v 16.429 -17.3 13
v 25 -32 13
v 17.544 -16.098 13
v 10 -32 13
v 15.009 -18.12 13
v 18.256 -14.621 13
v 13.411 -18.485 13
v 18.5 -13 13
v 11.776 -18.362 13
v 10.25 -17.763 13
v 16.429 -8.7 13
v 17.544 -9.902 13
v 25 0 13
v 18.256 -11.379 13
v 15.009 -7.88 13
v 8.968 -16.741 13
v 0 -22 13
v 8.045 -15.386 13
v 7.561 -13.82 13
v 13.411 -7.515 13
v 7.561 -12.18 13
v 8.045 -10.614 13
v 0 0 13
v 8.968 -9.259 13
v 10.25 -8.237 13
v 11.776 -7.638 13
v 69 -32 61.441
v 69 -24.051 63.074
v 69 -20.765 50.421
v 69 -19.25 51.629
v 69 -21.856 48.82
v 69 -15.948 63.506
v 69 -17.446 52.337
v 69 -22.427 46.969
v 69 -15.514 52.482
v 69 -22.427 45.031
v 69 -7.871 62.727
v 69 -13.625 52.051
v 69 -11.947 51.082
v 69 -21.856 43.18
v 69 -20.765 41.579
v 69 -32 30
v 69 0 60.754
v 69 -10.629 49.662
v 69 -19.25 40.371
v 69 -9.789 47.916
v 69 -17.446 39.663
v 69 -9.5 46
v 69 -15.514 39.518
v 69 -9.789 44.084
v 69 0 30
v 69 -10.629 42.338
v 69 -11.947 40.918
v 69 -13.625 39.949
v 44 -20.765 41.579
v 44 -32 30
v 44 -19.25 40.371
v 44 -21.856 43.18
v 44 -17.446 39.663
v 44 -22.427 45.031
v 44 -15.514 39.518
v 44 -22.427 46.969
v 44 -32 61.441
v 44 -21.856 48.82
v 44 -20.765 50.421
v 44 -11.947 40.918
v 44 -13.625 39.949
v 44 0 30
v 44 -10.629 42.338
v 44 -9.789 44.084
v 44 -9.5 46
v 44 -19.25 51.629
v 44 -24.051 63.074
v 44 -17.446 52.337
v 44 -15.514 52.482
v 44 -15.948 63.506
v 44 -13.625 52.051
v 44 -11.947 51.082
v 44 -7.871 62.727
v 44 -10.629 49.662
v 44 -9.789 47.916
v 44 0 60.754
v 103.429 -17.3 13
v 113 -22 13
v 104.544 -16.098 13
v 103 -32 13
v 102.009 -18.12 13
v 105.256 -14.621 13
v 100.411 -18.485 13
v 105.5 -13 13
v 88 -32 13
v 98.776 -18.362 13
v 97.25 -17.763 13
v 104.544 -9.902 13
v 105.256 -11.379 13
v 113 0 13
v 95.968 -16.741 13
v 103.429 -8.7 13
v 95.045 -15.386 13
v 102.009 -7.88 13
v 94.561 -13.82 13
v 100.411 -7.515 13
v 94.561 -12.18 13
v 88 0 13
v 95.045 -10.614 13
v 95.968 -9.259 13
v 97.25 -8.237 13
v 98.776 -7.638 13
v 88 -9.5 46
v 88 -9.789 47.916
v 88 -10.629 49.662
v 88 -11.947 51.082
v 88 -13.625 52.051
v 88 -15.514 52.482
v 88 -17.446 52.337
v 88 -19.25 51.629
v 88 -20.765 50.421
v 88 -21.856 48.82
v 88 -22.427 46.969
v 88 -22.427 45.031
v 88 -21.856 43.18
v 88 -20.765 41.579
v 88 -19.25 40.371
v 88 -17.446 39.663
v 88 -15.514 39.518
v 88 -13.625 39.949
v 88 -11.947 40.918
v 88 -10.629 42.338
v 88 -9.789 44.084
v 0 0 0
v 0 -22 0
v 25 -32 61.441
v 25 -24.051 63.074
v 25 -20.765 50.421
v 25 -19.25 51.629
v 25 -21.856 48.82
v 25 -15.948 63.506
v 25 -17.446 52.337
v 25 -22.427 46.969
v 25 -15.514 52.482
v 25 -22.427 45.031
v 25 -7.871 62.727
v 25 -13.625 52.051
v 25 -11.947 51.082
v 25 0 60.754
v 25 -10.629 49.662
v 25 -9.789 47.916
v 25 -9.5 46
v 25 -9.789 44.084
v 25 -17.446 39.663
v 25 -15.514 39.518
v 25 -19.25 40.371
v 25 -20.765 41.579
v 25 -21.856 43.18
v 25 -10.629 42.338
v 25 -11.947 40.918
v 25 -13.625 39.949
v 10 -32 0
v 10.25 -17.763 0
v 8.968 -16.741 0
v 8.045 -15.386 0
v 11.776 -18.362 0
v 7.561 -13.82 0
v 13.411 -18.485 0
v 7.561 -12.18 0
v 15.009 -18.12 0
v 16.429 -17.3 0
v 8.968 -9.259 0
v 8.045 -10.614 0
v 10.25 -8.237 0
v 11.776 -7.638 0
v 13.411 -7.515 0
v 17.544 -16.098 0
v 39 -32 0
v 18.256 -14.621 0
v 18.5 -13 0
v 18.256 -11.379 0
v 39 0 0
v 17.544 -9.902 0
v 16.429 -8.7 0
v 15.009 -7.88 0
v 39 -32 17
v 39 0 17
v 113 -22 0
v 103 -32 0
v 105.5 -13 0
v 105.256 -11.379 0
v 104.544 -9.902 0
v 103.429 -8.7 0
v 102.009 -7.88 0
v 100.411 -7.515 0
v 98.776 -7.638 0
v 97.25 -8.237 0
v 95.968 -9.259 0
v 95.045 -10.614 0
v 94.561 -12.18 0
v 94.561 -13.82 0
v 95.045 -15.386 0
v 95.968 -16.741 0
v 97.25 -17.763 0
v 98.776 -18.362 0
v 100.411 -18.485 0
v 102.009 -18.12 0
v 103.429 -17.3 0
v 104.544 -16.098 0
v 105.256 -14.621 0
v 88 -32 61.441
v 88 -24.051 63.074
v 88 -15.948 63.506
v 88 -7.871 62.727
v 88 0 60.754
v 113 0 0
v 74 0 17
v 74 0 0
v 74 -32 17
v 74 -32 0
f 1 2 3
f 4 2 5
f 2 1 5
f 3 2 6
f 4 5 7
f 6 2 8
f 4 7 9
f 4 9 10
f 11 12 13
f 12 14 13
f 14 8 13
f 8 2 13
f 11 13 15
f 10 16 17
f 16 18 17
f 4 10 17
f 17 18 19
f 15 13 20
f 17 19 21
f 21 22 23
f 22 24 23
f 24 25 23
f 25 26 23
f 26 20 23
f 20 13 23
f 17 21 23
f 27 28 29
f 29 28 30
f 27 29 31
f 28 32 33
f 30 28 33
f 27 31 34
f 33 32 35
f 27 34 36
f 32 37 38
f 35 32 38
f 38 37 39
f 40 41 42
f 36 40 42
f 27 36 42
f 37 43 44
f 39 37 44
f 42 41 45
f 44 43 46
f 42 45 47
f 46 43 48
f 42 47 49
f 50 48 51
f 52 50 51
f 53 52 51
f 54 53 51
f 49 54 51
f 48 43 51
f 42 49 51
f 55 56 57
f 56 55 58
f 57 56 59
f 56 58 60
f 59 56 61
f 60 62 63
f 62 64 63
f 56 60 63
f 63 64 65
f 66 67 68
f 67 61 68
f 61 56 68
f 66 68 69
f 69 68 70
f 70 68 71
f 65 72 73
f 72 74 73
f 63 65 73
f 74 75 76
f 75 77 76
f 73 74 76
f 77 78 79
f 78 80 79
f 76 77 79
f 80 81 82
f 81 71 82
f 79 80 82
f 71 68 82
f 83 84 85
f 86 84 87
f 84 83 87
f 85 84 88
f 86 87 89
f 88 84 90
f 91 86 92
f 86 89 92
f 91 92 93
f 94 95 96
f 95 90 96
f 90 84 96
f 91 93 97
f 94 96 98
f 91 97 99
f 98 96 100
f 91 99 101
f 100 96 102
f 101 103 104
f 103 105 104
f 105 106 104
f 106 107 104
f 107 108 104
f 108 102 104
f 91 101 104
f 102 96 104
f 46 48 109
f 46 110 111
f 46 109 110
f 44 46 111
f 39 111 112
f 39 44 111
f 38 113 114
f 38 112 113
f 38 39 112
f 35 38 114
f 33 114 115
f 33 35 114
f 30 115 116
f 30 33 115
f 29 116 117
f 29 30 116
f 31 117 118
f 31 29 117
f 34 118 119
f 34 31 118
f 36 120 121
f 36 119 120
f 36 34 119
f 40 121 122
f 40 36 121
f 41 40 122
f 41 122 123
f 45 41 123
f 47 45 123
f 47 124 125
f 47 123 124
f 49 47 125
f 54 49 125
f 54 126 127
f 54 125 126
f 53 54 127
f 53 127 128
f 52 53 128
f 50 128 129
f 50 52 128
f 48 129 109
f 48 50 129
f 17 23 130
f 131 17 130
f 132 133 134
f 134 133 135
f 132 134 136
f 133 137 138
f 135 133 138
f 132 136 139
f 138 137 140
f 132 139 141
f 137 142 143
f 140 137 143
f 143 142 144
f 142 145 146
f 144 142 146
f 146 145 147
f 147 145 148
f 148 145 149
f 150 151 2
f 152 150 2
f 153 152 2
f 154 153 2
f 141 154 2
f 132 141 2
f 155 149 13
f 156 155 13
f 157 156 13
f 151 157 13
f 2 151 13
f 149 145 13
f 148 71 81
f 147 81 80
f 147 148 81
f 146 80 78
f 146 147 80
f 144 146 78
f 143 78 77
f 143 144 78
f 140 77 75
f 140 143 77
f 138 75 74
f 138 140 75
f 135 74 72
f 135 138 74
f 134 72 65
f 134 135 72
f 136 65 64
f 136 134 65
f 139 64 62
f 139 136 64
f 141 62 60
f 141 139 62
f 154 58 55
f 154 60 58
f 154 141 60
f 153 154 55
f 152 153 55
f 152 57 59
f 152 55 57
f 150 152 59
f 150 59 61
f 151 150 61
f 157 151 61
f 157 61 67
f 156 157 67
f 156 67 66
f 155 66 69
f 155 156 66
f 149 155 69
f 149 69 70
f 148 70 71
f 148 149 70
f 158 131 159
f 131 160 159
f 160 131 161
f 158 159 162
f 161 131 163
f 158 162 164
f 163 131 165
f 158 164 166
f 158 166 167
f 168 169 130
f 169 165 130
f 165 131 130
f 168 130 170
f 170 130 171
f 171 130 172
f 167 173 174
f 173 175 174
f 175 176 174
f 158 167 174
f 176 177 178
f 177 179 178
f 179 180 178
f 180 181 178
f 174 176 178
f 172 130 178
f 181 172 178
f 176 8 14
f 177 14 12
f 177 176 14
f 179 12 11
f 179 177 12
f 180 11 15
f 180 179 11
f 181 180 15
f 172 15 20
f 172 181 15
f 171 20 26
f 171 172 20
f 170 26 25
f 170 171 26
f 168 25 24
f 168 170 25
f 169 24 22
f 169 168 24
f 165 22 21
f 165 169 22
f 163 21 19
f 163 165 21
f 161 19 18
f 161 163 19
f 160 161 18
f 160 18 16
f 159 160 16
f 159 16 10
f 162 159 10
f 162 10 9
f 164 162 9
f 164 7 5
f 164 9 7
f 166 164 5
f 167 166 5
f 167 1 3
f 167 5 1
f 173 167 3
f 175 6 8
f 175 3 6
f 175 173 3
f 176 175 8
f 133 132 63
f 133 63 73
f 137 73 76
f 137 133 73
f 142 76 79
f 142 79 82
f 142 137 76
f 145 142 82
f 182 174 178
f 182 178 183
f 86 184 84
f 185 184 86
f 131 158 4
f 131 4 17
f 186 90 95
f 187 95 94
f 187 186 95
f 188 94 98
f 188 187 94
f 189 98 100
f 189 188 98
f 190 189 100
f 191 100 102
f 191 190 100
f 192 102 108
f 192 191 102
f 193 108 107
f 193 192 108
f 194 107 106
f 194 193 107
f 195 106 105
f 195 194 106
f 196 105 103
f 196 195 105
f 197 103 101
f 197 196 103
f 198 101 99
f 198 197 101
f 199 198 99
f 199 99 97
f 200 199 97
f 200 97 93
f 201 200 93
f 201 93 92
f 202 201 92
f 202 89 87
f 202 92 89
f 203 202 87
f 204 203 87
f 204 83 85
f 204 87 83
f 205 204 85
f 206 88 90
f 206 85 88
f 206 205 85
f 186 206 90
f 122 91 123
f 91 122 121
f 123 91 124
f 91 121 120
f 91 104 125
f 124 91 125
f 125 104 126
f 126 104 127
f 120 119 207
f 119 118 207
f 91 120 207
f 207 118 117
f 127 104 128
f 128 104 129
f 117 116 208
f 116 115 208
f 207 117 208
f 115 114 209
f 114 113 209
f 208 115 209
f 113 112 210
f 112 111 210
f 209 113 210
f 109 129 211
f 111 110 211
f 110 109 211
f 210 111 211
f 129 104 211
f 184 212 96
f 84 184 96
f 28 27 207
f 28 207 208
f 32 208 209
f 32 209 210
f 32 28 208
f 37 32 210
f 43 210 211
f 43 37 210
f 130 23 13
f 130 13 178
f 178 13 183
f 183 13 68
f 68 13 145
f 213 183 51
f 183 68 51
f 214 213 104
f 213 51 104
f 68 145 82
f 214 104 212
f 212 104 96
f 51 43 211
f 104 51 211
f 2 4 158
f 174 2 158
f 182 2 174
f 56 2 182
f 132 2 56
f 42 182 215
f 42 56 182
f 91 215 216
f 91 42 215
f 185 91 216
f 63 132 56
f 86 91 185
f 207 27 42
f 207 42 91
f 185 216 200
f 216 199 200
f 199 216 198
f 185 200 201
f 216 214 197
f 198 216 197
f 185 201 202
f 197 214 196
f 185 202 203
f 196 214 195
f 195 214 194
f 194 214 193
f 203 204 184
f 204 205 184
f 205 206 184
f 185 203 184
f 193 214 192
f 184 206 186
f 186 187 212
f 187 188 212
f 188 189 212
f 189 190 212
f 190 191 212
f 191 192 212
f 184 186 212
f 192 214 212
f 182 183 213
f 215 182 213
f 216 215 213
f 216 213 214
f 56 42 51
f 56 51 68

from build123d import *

# Parameters (mm, degrees)
F1_DEPTH = 32
F2_R     = 5.5
F3_DEPTH = 25
F4_R     = 6.5
F5_DEPTH = 132.41419


with BuildPart() as f1:
    # F0 (on Front) → F1 (new body)
    with BuildSketch(Plane.XZ):
        Polygon((0, 13), (0, 0), (39, 0), (39, 17), (74, 17), (74, 0), (113, 0), (113, 13), (88, 13), (88, 64), (69, 64), (69, 30), (44, 30), (44, 64), (25, 64), (25, 13), align=None)
    extrude(amount=F1_DEPTH)

    # F2 (on Top) → F3 (cut)
    with BuildSketch(Plane.XY):
        with Locations((13, -13)):
            Circle(F2_R)
        with Locations((100, -13)):
            Circle(F2_R)
        Polygon((10, -32), (0, -22), (0, -32), align=None)
        Polygon((113, -22), (103, -32), (113, -32), align=None)
    extrude(amount=F3_DEPTH, mode=Mode.SUBTRACT)

    # F4 (on Right) → F5 (cut)
    with BuildSketch(Plane.YZ):
        with Locations((-16, 46)):
            Circle(F4_R)
        with BuildLine():
            ThreePointArc((-32, 61.440635), (-15.948352, 63.505935), (0, 60.7544))
            Line((0, 60.7544), (0, 64))
            Line((0, 64), (-32, 64))
            Line((-32, 64), (-32, 61.440635))
        make_face()
    extrude(amount=F5_DEPTH, mode=Mode.SUBTRACT)


solid = f1.part
